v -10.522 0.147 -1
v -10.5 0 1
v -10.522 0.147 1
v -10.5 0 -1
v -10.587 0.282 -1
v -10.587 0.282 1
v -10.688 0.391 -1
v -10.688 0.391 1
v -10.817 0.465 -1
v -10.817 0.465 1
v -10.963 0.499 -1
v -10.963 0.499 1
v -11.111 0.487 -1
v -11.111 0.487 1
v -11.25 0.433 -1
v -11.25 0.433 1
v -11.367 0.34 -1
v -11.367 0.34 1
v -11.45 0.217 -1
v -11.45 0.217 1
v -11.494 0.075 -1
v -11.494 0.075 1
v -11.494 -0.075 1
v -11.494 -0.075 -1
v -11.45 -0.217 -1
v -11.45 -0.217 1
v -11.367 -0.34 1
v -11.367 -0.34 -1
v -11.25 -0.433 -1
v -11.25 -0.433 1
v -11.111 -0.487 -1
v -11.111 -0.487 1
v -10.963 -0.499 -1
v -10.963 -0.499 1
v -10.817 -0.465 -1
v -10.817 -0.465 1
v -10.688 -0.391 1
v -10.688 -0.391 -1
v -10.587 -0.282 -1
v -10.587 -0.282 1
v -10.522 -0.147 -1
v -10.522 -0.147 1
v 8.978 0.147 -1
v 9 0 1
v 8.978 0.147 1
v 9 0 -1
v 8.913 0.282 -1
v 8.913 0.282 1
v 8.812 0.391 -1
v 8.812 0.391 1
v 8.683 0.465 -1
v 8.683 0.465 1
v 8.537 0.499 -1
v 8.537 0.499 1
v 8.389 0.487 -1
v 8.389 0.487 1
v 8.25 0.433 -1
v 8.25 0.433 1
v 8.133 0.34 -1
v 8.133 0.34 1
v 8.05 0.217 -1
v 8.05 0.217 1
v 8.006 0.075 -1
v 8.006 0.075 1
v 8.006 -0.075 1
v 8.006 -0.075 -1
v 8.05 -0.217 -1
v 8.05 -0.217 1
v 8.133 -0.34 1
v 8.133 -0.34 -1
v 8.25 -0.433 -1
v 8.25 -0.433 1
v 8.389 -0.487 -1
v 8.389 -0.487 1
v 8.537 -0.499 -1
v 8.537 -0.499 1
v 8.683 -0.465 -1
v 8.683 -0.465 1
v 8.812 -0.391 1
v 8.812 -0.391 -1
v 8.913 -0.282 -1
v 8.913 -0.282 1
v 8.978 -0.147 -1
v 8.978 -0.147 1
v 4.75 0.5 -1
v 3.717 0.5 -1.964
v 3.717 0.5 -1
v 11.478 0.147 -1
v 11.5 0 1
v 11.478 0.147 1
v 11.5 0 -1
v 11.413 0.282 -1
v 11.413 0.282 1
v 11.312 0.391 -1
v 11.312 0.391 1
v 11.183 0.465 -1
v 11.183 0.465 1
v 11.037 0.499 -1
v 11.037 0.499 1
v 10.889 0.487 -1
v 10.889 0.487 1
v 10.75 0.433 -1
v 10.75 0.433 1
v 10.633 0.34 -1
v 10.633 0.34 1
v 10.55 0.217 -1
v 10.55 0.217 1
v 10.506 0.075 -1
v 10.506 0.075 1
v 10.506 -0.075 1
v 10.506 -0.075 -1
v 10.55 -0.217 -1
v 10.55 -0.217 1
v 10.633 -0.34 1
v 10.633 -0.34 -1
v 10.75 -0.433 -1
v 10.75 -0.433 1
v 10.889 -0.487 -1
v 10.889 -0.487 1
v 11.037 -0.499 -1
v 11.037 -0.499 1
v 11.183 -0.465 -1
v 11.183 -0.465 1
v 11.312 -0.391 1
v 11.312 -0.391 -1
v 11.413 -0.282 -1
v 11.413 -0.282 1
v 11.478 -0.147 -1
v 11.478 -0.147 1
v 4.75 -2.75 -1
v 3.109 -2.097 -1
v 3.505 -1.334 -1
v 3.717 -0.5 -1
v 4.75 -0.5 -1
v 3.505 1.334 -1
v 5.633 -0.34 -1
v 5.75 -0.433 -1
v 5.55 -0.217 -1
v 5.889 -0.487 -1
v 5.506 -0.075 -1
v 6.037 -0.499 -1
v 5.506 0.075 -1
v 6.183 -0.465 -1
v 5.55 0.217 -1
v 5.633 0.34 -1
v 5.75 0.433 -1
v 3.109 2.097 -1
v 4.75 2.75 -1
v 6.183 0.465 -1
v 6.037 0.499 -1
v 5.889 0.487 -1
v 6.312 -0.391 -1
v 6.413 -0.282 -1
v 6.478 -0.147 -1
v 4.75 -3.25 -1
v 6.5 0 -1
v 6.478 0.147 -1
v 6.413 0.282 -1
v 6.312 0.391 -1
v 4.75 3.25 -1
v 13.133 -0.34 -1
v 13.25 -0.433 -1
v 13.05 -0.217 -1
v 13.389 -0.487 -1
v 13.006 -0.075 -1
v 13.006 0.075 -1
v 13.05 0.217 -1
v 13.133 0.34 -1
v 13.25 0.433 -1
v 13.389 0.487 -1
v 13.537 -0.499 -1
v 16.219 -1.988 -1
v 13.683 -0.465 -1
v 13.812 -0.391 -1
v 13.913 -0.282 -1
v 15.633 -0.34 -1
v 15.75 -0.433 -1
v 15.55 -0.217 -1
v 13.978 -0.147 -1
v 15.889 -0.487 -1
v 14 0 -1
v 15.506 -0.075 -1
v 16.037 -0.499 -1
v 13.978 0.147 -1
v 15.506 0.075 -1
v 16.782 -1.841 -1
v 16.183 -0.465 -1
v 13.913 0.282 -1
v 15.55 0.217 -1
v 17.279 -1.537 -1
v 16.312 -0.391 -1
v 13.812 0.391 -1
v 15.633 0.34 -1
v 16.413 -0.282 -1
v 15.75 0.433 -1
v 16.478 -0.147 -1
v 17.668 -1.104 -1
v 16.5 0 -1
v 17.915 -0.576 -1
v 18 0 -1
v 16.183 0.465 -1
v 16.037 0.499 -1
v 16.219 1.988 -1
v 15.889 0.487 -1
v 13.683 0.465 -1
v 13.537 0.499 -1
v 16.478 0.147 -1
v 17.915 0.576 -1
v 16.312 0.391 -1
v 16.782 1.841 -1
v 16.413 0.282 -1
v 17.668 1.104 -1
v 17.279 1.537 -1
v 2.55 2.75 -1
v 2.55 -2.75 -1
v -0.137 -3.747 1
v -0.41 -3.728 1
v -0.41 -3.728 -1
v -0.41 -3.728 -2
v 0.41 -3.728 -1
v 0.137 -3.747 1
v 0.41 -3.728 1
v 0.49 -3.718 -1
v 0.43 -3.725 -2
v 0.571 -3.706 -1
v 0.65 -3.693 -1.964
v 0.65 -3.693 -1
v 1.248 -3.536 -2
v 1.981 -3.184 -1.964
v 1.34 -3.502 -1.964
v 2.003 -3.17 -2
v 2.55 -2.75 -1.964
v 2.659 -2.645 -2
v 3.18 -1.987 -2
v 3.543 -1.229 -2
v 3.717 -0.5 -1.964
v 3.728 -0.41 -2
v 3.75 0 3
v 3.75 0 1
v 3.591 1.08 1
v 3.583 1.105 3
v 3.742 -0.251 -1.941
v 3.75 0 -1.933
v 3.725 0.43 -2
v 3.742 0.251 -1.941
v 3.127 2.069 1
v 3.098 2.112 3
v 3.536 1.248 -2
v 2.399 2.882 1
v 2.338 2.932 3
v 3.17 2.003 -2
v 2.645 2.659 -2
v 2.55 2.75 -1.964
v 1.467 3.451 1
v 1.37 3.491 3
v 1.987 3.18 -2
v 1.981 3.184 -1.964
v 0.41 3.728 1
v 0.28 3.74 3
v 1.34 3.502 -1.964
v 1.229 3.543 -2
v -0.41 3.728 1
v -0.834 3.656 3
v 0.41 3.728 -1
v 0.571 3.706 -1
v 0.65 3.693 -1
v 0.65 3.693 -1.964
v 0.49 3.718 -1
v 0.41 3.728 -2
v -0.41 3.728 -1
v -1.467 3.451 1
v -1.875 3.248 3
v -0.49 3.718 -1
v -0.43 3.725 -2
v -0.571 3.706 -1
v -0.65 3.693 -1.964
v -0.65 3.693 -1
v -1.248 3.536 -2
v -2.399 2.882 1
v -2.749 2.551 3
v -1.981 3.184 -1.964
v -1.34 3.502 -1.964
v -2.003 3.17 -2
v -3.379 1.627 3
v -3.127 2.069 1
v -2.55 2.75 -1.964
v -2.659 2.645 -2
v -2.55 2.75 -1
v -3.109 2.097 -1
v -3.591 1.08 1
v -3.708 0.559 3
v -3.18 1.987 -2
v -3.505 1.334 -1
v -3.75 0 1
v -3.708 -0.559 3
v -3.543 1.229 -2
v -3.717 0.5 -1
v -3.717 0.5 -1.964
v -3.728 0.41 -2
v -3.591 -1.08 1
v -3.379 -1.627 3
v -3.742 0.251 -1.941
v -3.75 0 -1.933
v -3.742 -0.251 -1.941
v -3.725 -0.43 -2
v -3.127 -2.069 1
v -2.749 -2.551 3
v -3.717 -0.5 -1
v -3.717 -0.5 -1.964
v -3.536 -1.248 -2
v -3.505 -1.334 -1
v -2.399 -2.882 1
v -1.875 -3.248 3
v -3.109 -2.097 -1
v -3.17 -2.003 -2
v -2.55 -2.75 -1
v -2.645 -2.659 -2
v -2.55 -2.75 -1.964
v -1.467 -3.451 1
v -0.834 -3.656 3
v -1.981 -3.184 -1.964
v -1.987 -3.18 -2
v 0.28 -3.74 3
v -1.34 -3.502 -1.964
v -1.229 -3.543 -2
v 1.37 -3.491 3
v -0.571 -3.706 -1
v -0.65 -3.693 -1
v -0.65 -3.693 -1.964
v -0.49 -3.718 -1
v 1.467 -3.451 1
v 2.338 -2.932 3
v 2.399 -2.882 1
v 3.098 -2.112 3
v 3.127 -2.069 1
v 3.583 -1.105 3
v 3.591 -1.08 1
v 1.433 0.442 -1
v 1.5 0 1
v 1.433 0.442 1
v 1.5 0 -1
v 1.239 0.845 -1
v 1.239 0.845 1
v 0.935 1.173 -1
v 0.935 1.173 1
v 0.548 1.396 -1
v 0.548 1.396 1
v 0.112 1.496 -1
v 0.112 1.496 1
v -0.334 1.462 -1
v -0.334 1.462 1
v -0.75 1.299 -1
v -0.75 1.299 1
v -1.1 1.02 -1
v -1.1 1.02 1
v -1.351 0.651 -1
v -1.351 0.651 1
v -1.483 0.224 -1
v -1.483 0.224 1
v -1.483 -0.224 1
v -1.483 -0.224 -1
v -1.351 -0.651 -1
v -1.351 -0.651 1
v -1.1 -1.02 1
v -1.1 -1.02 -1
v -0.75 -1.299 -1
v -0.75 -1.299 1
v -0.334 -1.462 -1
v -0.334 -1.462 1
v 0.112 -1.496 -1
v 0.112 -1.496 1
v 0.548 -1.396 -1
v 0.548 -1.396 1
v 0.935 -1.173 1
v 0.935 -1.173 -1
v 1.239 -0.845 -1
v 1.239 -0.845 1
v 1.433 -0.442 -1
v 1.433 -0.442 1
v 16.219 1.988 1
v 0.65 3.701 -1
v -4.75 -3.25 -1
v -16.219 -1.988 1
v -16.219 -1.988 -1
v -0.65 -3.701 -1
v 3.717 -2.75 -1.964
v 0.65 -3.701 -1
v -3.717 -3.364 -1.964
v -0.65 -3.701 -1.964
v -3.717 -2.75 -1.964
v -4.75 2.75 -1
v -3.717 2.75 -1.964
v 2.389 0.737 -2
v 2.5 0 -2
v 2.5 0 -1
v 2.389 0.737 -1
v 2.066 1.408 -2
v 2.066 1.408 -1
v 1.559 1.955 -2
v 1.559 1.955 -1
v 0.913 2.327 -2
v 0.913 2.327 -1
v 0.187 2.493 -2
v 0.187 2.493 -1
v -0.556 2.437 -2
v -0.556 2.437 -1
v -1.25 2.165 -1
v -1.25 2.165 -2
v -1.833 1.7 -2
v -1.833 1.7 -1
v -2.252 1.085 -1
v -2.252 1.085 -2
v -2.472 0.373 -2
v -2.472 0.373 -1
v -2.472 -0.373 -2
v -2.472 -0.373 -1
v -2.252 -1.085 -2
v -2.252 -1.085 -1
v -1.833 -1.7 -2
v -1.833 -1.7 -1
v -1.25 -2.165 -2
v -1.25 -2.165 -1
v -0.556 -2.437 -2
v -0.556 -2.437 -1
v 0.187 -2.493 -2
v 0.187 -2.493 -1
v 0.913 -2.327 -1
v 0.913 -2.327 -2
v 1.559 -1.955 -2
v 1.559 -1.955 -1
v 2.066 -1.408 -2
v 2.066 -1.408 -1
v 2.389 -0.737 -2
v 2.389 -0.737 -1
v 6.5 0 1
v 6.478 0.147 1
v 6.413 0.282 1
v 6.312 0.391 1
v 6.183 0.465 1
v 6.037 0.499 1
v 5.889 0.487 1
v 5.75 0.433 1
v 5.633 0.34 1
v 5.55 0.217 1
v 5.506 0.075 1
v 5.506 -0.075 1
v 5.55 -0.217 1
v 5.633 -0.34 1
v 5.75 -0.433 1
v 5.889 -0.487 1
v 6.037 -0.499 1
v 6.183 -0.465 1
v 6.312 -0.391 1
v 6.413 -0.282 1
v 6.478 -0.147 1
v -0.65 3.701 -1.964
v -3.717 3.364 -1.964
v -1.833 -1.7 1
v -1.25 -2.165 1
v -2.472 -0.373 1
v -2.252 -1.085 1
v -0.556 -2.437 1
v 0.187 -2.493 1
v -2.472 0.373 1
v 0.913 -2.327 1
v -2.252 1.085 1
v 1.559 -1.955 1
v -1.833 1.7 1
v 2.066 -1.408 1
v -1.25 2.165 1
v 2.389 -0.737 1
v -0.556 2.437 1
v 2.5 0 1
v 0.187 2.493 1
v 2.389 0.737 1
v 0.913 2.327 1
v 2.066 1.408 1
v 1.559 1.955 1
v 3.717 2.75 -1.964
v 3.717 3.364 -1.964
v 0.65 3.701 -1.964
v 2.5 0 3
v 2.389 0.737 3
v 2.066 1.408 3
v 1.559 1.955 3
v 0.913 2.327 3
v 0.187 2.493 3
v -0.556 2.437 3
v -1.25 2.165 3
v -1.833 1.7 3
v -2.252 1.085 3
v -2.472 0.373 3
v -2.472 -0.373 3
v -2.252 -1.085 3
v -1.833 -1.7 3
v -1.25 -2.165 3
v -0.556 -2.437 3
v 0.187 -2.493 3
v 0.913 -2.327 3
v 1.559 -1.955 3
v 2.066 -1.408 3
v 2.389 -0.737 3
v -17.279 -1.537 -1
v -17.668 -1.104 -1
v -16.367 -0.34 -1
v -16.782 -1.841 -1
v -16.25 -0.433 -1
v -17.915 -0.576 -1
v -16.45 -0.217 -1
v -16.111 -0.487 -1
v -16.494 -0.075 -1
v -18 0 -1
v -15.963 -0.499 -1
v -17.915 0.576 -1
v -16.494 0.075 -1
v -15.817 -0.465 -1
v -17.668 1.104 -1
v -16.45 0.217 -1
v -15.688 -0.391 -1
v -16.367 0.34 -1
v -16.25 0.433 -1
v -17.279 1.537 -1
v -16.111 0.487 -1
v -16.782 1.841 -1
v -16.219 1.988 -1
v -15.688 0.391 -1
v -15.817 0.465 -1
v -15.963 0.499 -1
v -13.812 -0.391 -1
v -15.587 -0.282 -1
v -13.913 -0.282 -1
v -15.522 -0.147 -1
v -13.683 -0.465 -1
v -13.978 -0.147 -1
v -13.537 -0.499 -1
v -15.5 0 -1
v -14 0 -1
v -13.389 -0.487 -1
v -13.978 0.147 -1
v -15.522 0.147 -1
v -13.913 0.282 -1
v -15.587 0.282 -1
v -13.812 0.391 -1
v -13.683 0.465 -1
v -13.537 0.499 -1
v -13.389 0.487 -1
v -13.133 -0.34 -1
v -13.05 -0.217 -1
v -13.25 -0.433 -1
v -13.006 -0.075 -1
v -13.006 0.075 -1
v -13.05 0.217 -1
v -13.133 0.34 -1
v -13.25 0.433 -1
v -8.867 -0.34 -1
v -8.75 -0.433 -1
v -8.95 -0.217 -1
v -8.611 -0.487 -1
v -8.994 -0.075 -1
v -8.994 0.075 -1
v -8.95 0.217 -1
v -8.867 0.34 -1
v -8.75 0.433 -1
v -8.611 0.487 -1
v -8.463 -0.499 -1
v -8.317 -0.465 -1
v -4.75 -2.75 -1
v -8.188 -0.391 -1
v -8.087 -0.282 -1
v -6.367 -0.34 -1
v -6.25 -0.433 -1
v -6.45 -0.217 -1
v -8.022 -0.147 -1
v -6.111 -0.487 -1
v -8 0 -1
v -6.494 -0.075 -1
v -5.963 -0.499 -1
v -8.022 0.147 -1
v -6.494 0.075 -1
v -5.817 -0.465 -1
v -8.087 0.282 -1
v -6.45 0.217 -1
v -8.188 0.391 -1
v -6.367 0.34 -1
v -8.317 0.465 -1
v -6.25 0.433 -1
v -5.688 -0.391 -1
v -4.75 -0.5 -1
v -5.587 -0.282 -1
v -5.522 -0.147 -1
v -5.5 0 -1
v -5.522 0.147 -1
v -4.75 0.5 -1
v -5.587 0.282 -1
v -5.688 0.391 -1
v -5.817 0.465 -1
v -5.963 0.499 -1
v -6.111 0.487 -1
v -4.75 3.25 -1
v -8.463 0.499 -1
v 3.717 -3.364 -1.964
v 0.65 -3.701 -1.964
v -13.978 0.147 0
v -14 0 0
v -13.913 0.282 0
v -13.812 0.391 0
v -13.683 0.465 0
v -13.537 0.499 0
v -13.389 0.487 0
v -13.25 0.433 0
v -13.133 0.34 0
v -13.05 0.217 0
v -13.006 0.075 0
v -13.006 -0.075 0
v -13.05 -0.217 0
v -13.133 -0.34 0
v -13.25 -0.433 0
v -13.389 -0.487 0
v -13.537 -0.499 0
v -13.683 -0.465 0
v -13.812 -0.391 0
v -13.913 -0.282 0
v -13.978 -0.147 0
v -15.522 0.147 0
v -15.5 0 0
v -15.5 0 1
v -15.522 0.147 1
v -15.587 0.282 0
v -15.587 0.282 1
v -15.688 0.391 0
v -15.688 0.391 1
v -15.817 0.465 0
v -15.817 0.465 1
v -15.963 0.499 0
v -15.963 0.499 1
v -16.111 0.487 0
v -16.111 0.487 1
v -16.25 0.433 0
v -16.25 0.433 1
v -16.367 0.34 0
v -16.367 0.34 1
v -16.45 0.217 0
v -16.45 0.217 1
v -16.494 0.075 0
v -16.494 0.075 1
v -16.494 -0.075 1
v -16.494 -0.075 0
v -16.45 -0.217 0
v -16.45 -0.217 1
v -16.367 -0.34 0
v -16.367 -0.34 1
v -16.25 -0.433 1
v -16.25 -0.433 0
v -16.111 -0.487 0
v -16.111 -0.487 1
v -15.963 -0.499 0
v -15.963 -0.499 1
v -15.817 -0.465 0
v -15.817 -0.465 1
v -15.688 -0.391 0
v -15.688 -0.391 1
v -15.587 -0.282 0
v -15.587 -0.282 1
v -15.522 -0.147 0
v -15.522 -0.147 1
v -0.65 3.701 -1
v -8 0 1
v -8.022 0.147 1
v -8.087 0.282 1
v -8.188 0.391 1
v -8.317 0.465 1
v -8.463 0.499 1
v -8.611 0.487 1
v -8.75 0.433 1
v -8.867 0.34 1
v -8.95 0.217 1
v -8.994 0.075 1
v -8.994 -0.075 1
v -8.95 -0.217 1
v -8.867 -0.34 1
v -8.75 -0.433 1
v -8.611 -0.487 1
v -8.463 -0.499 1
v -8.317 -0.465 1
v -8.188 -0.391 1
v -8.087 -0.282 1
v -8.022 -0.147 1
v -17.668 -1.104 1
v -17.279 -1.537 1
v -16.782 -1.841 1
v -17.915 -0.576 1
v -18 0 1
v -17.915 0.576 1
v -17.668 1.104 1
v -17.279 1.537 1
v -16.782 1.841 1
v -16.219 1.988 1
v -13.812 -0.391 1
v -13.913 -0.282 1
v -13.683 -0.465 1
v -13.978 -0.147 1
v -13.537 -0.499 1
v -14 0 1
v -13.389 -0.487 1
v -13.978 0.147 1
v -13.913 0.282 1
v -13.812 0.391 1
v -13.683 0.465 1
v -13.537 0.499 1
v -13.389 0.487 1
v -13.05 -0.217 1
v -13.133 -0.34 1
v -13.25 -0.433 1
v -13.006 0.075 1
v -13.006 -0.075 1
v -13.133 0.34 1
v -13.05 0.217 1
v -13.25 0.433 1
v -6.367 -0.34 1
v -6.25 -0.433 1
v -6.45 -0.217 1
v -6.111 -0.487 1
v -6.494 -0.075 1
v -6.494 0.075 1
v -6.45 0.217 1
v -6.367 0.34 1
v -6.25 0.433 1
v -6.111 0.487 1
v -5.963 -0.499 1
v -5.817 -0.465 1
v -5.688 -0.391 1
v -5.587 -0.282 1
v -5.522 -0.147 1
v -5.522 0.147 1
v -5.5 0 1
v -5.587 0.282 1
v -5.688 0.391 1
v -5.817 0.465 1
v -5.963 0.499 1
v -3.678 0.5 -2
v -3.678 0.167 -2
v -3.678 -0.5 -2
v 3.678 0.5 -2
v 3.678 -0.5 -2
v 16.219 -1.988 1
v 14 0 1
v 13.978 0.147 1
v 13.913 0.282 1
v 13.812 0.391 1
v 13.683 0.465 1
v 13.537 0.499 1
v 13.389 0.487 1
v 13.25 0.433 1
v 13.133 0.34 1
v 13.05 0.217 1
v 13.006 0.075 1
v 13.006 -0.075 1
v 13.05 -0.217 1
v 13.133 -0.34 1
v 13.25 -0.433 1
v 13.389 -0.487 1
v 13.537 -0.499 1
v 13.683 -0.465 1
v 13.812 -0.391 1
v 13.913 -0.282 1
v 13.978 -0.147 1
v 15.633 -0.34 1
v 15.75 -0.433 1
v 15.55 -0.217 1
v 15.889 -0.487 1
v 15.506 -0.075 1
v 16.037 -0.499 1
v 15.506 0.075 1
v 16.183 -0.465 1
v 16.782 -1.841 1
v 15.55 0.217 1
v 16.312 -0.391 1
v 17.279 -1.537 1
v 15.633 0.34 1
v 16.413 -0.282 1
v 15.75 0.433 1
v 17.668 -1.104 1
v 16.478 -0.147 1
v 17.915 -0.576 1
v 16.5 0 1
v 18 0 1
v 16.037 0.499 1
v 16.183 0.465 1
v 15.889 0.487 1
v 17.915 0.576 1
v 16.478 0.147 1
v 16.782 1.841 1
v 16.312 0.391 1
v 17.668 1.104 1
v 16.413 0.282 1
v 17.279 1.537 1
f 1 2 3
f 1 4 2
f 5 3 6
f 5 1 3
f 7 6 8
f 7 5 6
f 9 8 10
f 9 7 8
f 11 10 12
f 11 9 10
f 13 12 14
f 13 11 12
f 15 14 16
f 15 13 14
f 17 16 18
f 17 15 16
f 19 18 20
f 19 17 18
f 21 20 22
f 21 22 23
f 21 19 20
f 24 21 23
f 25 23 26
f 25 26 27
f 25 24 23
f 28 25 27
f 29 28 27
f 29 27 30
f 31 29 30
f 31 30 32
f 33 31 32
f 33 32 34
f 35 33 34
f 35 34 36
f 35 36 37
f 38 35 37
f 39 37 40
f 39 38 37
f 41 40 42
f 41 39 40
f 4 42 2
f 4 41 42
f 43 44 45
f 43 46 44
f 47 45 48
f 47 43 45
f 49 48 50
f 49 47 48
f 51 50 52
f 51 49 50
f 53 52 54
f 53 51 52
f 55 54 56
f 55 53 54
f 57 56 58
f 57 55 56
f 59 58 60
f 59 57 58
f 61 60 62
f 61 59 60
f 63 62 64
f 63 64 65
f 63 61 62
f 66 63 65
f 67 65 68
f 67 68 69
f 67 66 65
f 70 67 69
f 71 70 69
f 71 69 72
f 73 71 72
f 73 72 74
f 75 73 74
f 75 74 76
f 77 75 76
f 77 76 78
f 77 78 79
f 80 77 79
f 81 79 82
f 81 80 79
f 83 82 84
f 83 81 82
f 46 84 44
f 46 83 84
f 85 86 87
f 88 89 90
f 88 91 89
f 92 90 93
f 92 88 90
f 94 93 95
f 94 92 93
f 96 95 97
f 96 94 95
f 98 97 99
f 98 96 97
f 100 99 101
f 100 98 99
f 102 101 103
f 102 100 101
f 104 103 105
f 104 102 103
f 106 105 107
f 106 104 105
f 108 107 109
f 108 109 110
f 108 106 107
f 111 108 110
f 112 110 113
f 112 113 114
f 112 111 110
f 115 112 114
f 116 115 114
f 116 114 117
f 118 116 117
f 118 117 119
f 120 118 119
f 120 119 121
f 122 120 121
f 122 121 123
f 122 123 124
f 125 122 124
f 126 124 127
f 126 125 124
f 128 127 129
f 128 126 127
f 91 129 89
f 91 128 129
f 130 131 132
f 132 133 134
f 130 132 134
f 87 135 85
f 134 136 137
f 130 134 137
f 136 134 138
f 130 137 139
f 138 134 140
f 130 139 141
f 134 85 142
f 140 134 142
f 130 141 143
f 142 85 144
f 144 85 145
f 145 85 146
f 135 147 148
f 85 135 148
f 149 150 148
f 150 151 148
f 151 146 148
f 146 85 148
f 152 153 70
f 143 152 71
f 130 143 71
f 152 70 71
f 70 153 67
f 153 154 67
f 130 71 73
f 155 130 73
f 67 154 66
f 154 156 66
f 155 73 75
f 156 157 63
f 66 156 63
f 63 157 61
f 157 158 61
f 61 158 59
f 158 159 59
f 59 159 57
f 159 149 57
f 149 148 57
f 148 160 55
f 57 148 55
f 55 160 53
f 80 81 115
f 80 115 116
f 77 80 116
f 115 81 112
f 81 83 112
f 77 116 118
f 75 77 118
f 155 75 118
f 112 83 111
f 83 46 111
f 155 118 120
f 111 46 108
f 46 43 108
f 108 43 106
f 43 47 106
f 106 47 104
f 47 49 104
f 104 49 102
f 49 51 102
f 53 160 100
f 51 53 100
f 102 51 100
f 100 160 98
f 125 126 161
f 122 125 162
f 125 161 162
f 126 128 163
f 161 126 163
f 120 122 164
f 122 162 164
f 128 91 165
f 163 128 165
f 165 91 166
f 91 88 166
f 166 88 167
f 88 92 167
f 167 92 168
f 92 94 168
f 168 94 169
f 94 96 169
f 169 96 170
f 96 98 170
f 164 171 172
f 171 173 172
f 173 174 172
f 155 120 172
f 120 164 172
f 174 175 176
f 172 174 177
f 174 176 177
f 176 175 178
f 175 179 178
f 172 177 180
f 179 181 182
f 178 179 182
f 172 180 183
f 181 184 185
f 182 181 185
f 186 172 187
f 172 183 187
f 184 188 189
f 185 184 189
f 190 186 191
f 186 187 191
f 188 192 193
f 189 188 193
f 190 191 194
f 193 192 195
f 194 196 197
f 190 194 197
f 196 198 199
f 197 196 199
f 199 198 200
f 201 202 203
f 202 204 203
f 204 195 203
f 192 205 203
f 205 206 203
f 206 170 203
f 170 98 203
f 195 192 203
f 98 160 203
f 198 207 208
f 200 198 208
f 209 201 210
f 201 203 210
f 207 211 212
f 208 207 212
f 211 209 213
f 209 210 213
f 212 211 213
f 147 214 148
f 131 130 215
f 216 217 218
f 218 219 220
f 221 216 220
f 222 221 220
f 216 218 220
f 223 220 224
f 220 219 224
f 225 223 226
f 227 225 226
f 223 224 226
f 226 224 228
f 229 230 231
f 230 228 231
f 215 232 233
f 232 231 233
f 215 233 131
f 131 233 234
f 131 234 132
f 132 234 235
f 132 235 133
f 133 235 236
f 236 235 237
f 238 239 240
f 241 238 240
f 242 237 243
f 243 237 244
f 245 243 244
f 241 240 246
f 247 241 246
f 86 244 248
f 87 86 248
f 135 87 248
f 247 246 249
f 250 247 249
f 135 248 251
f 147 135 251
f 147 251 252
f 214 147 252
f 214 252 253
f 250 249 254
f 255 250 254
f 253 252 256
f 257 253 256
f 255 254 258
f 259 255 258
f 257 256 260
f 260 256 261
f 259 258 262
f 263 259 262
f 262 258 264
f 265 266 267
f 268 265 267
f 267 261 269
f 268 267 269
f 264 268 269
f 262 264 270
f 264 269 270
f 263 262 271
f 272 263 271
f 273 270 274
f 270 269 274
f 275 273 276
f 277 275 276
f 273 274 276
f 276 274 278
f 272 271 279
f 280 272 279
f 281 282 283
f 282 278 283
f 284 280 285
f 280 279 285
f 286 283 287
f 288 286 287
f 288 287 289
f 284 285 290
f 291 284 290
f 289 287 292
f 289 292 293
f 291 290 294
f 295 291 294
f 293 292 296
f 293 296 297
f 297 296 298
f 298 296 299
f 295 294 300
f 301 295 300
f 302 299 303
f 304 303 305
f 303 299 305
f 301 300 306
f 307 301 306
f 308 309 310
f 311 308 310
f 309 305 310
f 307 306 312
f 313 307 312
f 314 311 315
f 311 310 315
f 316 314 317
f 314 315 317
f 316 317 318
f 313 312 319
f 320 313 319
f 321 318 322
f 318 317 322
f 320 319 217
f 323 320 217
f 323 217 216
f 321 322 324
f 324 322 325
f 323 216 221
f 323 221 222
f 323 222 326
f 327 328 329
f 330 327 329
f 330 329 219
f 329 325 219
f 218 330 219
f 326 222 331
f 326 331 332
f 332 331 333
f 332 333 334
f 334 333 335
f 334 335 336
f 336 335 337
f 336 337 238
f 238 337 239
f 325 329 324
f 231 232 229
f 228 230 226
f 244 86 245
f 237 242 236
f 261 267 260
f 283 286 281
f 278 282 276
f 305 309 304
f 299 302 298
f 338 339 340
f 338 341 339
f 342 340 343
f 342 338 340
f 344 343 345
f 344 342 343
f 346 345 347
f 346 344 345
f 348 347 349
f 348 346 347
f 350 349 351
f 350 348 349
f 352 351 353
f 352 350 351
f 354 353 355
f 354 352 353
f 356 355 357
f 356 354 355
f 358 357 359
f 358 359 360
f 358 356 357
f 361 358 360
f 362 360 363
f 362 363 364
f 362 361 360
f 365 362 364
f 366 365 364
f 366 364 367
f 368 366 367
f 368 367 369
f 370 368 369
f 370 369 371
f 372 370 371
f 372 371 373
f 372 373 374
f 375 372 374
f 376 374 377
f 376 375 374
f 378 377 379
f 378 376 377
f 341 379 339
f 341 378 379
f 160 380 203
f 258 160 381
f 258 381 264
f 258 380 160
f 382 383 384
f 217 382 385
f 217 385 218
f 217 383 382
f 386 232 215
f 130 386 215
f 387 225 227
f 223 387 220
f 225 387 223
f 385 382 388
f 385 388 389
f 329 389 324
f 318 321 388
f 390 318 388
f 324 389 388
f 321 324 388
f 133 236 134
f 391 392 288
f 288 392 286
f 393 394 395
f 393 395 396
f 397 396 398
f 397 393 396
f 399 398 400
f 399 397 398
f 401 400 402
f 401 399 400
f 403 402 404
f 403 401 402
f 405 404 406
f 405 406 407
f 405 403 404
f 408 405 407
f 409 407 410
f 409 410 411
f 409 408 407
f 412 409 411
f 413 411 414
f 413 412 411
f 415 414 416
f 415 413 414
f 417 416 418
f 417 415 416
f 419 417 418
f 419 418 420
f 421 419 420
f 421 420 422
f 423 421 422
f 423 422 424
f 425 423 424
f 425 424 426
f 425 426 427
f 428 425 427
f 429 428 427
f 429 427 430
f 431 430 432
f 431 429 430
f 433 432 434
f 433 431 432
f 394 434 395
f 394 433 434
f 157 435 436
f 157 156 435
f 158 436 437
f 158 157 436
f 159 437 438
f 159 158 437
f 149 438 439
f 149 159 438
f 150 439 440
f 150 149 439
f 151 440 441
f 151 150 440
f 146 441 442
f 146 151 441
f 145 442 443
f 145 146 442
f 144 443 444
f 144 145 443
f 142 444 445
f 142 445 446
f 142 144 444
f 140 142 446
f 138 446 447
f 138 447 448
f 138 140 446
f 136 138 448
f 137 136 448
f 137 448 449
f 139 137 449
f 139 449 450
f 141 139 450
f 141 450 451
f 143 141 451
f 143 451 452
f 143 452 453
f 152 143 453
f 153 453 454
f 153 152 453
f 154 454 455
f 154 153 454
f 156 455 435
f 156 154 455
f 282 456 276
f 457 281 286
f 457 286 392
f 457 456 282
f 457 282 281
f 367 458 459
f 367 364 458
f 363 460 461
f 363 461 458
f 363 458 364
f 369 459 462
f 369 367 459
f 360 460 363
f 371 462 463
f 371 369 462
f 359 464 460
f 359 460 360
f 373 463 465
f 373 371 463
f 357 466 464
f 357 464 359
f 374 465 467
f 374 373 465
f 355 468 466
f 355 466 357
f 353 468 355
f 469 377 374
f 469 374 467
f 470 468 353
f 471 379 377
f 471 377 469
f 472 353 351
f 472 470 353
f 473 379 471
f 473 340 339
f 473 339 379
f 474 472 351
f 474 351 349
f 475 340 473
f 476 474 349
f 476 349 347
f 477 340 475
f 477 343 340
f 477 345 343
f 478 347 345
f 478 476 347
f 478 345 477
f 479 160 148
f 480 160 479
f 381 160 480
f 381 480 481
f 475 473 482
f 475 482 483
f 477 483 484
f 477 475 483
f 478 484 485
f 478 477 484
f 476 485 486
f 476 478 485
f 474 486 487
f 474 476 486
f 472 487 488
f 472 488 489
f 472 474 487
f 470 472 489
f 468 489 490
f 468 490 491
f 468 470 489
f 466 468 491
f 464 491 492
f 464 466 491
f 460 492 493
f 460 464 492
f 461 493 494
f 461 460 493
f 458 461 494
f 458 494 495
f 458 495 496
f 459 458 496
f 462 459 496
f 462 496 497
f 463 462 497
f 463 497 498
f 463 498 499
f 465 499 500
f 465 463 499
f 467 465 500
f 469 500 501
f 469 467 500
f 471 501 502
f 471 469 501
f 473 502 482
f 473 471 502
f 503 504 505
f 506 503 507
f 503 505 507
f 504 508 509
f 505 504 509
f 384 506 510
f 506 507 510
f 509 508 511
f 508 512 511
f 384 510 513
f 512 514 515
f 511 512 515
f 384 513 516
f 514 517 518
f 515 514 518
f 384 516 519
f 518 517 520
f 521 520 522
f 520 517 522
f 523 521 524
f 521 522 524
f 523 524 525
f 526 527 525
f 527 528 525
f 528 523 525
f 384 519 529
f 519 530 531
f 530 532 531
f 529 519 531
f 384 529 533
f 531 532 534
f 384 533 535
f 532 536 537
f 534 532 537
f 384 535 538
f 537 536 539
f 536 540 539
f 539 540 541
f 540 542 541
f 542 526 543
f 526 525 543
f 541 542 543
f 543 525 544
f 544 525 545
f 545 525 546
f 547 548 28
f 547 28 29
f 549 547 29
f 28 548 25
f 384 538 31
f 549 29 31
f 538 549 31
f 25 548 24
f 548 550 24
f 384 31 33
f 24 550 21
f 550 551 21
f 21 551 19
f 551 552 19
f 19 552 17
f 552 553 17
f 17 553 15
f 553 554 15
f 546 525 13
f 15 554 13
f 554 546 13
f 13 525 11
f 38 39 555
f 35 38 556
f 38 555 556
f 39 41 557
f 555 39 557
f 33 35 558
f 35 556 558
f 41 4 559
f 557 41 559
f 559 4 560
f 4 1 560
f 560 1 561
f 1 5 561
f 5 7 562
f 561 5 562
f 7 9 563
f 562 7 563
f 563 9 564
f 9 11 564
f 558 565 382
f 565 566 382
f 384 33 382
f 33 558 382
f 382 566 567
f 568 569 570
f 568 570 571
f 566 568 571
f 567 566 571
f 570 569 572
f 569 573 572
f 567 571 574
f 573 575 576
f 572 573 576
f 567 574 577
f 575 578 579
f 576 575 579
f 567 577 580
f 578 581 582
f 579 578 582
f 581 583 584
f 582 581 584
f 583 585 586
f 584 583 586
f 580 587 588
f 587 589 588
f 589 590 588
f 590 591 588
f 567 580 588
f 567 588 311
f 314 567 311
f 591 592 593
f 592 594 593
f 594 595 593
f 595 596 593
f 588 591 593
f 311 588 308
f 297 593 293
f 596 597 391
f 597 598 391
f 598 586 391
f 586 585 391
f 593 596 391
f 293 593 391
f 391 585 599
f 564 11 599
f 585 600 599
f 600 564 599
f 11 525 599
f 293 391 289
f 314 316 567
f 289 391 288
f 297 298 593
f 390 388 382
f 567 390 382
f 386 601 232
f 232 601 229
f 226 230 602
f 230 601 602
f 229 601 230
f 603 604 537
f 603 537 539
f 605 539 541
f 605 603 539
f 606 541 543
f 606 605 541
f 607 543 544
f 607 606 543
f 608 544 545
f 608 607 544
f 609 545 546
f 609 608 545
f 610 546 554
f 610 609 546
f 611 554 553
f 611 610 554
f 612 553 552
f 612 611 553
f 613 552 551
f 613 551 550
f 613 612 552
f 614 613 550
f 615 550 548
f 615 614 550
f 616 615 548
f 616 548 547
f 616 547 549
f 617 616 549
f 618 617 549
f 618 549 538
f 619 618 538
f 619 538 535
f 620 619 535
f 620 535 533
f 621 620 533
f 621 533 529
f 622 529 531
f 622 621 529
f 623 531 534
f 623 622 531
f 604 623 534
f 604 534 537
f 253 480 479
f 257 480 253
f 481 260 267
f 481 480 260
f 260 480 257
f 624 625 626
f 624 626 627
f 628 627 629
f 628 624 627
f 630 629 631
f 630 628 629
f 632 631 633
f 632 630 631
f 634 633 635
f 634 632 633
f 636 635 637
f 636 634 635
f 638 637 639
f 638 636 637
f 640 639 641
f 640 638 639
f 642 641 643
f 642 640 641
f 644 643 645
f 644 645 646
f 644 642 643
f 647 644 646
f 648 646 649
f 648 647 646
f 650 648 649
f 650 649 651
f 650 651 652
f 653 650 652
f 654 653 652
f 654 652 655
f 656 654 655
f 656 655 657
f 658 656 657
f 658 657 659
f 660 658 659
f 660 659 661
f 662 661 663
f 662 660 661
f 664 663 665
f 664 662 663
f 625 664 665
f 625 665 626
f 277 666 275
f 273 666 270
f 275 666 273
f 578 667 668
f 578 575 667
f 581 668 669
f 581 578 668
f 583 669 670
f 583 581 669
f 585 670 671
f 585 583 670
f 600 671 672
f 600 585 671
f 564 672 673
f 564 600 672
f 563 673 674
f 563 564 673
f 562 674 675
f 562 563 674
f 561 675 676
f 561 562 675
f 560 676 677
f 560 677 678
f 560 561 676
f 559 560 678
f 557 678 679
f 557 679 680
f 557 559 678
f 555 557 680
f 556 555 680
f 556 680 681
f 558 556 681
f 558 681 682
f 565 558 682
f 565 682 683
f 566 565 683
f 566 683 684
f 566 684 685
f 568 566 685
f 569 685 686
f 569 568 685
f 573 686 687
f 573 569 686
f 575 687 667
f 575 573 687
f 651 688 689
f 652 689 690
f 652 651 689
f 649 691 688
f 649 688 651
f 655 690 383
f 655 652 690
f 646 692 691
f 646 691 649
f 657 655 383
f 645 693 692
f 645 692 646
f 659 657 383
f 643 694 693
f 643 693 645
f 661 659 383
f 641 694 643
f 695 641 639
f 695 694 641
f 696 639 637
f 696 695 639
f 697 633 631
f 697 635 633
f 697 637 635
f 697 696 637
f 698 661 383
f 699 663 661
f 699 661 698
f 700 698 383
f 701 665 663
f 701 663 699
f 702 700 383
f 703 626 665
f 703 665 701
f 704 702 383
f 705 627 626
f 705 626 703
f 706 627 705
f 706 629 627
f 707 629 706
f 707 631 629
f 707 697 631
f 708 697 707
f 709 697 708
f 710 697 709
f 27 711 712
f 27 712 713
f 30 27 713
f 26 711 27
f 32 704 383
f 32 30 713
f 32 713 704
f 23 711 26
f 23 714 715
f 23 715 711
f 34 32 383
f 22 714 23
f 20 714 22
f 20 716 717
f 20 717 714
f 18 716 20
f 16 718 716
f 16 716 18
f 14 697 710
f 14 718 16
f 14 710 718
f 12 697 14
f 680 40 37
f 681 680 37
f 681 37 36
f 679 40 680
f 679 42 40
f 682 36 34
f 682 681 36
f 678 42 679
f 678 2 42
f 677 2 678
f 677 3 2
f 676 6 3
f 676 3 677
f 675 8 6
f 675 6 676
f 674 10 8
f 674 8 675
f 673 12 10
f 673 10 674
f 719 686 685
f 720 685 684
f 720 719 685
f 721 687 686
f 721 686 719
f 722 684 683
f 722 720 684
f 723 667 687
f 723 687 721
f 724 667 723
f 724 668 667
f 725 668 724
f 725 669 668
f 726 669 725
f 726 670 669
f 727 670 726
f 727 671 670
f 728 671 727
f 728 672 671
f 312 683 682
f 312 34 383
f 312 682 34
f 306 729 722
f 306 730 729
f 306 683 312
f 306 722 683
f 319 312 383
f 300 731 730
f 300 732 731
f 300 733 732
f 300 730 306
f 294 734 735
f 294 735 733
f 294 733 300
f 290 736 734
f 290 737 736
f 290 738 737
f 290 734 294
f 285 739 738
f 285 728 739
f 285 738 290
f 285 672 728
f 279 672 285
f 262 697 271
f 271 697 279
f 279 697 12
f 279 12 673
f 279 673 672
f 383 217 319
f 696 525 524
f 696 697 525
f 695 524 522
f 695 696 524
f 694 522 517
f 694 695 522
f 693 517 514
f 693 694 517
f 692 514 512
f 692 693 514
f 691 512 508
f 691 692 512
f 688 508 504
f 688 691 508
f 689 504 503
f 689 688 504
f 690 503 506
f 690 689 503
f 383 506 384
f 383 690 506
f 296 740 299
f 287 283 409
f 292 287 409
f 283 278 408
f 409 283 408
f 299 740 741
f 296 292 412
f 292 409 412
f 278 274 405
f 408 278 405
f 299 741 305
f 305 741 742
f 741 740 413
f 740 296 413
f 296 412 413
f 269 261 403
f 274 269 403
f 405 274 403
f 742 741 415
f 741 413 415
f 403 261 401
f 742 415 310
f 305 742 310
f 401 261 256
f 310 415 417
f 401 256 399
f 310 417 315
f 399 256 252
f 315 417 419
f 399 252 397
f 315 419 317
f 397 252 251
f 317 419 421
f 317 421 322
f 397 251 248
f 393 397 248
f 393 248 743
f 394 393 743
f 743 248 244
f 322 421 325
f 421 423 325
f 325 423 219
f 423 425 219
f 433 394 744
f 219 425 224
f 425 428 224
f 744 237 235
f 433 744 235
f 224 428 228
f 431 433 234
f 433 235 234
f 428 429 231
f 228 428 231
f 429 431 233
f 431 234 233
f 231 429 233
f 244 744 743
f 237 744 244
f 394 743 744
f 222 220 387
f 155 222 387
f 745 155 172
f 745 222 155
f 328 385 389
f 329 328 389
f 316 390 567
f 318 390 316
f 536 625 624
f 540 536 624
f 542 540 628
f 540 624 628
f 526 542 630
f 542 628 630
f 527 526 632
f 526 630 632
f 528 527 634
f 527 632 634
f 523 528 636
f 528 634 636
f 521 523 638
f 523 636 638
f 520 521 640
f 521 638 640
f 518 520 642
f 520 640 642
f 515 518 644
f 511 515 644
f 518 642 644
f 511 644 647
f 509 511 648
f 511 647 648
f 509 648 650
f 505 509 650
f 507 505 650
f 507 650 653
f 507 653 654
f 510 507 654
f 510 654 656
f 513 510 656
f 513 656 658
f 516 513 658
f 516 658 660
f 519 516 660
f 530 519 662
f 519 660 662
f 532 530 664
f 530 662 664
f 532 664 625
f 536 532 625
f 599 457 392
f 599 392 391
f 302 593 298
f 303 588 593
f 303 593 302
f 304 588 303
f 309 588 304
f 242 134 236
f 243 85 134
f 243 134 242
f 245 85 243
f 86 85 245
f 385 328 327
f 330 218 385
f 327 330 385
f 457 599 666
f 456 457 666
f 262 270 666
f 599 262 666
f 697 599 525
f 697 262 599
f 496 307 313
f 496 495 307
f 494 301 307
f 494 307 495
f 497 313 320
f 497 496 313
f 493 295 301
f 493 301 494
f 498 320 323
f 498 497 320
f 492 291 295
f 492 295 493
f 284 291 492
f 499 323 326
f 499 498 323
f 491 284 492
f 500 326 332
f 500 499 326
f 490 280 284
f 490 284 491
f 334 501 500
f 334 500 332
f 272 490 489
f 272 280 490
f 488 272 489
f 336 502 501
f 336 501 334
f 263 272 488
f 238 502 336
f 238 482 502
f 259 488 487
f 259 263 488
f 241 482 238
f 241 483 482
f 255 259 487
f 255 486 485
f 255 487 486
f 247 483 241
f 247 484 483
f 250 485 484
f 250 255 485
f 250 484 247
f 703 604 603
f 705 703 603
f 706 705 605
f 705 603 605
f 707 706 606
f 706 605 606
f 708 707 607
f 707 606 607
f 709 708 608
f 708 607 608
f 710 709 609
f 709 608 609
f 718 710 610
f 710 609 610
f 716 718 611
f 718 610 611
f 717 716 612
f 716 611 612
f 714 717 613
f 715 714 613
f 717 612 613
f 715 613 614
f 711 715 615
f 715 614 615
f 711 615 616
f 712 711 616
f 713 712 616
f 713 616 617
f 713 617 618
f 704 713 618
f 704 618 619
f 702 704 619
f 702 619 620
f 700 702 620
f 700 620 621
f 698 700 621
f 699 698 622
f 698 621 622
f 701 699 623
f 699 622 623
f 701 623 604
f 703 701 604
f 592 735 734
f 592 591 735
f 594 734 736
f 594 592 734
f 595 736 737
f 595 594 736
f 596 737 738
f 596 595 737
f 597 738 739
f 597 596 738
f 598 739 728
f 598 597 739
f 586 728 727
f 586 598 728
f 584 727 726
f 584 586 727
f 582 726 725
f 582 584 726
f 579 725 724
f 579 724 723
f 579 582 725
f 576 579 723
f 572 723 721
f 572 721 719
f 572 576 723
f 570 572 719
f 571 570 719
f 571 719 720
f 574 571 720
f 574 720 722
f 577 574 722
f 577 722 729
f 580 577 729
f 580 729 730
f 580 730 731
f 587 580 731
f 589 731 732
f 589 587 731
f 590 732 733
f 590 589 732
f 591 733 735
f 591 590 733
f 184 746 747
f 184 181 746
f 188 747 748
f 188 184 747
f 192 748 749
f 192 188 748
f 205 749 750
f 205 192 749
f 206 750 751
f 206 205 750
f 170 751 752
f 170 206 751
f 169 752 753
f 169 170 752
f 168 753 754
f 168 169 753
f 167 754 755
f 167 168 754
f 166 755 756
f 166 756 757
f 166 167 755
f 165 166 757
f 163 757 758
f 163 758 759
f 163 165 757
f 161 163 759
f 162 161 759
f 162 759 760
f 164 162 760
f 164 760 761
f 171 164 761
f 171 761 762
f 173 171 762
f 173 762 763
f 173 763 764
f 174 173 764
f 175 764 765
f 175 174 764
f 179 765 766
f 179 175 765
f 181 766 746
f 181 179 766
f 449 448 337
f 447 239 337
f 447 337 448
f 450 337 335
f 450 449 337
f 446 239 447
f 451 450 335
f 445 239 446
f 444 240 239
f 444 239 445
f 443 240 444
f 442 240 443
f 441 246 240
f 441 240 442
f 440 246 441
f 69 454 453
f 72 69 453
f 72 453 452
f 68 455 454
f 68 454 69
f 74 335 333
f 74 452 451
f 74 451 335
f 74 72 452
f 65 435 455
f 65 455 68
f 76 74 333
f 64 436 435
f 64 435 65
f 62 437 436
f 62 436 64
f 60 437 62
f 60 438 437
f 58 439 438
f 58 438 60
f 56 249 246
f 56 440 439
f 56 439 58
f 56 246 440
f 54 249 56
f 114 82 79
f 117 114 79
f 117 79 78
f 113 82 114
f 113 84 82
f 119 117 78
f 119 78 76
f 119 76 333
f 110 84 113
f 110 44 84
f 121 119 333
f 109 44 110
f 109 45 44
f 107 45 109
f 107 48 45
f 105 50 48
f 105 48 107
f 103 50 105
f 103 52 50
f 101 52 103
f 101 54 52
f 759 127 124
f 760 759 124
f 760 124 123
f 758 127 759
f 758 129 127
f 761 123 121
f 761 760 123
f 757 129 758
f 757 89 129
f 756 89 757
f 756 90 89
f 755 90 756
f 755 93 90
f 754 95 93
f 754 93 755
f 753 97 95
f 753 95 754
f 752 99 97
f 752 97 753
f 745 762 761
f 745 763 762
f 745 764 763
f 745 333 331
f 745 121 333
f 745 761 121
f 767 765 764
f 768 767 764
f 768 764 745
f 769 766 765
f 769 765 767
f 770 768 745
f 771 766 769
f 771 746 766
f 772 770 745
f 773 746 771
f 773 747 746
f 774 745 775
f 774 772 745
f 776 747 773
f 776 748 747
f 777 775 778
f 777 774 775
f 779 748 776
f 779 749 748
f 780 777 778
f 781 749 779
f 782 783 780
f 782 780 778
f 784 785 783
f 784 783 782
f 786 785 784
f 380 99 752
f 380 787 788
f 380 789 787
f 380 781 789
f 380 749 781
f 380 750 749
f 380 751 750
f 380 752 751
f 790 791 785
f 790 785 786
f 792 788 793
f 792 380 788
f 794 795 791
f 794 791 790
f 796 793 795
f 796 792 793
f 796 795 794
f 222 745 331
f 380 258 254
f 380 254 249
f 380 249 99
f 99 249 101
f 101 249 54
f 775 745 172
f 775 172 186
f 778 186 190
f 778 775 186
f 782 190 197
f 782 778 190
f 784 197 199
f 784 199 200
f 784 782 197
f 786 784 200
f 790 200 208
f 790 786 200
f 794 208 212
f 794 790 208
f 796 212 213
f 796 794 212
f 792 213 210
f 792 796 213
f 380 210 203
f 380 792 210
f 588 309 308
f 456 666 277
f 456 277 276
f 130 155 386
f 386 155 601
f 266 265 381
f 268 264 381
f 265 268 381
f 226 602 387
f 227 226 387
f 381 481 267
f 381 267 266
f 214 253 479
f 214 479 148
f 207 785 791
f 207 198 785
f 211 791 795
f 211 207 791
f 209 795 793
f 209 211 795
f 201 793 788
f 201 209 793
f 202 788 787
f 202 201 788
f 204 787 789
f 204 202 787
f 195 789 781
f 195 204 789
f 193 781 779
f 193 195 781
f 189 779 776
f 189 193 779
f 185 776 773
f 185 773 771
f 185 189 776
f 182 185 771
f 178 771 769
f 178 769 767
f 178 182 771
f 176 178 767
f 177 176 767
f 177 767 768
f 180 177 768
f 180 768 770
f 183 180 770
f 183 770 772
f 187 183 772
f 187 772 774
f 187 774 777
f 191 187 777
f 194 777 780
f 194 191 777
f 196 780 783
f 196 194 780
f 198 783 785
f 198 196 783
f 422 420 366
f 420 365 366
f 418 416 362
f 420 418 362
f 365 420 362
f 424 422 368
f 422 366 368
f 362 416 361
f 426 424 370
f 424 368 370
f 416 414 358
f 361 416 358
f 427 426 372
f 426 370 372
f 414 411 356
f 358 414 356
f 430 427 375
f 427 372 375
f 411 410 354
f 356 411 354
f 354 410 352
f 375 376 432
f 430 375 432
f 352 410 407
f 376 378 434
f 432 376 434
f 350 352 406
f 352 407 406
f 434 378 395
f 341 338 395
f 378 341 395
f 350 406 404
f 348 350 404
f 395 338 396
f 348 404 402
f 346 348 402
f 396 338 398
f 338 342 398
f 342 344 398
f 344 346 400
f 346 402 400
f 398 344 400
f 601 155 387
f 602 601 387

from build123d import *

# Parameters (mm, degrees)
CROQUIS1_R              = 0.5
CROQUIS1_R_2            = 2
CROQUIS1_R_3            = 3.75
CROQUIS1_R_4            = 2.5
CROQUIS1_R_5            = 1.5
SALIENTE_EXTRUIR1_DEPTH = 1
SALIENTE_EXTRUIR2_START = -2
CROQUIS1_3_R            = 3.75
CROQUIS1_3_R_2          = 2.5
SALIENTE_EXTRUIR2_DEPTH = 1
SALIENTE_EXTRUIR3_START = 1
CROQUIS1_4_R            = 3.75
CROQUIS1_4_R_2          = 2.5
SALIENTE_EXTRUIR3_DEPTH = 2
SALIENTE_EXTRUIR5_DEPTH = 0.5
SALIENTE_EXTRUIR6_START = 3.75
SALIENTE_EXTRUIR6_DEPTH = 1
SALIENTE_EXTRUIR7_START = -3.75
SALIENTE_EXTRUIR7_DEPTH = 1
CORTAR_EXTRUIR1_DEPTH   = 3


with BuildPart() as part:
    # Croquis1 → Saliente-Extruir1 (new, symmetric)
    with BuildSketch(Plane.XY):
        with BuildLine():
            ThreePointArc((-0.410156, -3.727502), (-3.75, 0), (-0.410156, 3.727502))
            Line((-0.410156, 3.727502), (-16.21875, 1.988001))
            ThreePointArc((-16.21875, 1.988001), (-14.665365, 1.489547), (-14, 0))
            ThreePointArc((-14, 0), (-14.665365, -1.489547), (-16.21875, -1.988001))
            Line((-16.21875, -1.988001), (-0.410156, -3.727502))
        make_face()
        with BuildLine():
            ThreePointArc((-13, 0), (-13.5, -0.5), (-14, 0))
            ThreePointArc((-14, 0), (-13.5, 0.5), (-13, 0))
        make_face(mode=Mode.SUBTRACT)
        with Locations((-11, 0)):
            Circle(CROQUIS1_R, mode=Mode.SUBTRACT)
        with Locations((-8.5, 0)):
            Circle(CROQUIS1_R, mode=Mode.SUBTRACT)
        with Locations((-6, 0)):
            Circle(CROQUIS1_R, mode=Mode.SUBTRACT)
        with Locations((-16, 0)):
            Circle(CROQUIS1_R_2)
        with Locations((-16, 0)):
            Circle(CROQUIS1_R, mode=Mode.SUBTRACT)
        Circle(CROQUIS1_R_3)
        Circle(CROQUIS1_R_4, mode=Mode.SUBTRACT)
        Circle(CROQUIS1_R_4)
        Circle(CROQUIS1_R_5, mode=Mode.SUBTRACT)
        with BuildLine():
            Line((16.21875, 1.988001), (0.410156, 3.727502))
            ThreePointArc((0.410156, 3.727502), (2.7929, 2.50244), (3.75, 0))
            ThreePointArc((3.75, 0), (2.7929, -2.50244), (0.410156, -3.727502))
            Line((0.410156, -3.727502), (16.21875, -1.988001))
            ThreePointArc((16.21875, -1.988001), (14.665365, -1.489547), (14, 0))
            ThreePointArc((14, 0), (14.665365, 1.489547), (16.21875, 1.988001))
        make_face()
        with Locations((6, 0)):
            Circle(CROQUIS1_R, mode=Mode.SUBTRACT)
        with Locations((8.5, 0)):
            Circle(CROQUIS1_R, mode=Mode.SUBTRACT)
        with Locations((11, 0)):
            Circle(CROQUIS1_R, mode=Mode.SUBTRACT)
        with Locations((13.5, 0)):
            Circle(CROQUIS1_R, mode=Mode.SUBTRACT)
        with Locations((16, 0)):
            Circle(CROQUIS1_R_2)
        with Locations((16, 0)):
            Circle(CROQUIS1_R, mode=Mode.SUBTRACT)
    extrude(amount=SALIENTE_EXTRUIR1_DEPTH, both=True)

    # Croquis1<3> → Saliente-Extruir2 (add)
    with BuildSketch(Plane.XY.offset(SALIENTE_EXTRUIR2_START)):
        with Locations(Location((0, 0, 0), (0, 0, 263.720712))):
            Circle(CROQUIS1_3_R)
        Circle(CROQUIS1_3_R_2, mode=Mode.SUBTRACT)
    extrude(amount=SALIENTE_EXTRUIR2_DEPTH)

    # Croquis1<4> → Saliente-Extruir3 (add)
    with BuildSketch(Plane.XY.offset(SALIENTE_EXTRUIR3_START)):
        Circle(CROQUIS1_4_R)
        Circle(CROQUIS1_4_R_2, mode=Mode.SUBTRACT)
    extrude(amount=SALIENTE_EXTRUIR3_DEPTH)

    # Croquis3 → Saliente-Extruir5 (add, symmetric)
    with BuildSketch(Plane(origin=(0, 0, 0), x_dir=(1, 0, 0), z_dir=(0, 1, 0))):
        Polygon((-4.75, 1), (-3.678391, 2), (-3.678391, 1), align=None)
        Polygon((3.678391, 1), (4.75, 1), (3.678391, 2), align=None)
    extrude(amount=SALIENTE_EXTRUIR5_DEPTH, both=True)

    # Croquis4 → Saliente-Extruir6 (add)
    with BuildSketch(Plane(origin=(0, 0, 0), x_dir=(1, 0, 0), z_dir=(0, 1, 0)).offset(SALIENTE_EXTRUIR6_START)):
        Polygon((-4.75, 1), (-0.650356, 1), (-0.650356, 1.964422), (-3.716517, 1.964422), align=None)
        Polygon((0.650356, 1.964422), (0.650356, 1), (4.75, 1), (3.716517, 1.964422), align=None)
    extrude(amount=-SALIENTE_EXTRUIR6_DEPTH)

    # Croquis4<2> → Saliente-Extruir7 (add)
    with BuildSketch(Plane(origin=(0, 0, 0), x_dir=(1, 0, 0), z_dir=(0, 1, 0)).offset(SALIENTE_EXTRUIR7_START)):
        Polygon((-4.75, 1), (-0.650356, 1), (-0.650356, 1.964422), (-3.716517, 1.964422), align=None)
        Polygon((0.650356, 1.964422), (0.650356, 1), (4.75, 1), (3.716517, 1.964422), align=None)
    extrude(amount=SALIENTE_EXTRUIR7_DEPTH)

    # Croquis5 → Cortar-Extruir1 (cut)
    with BuildSketch(Plane.XY.offset(-1)):
        Polygon((0.650356, -3.75), (4.75, -3.75), (4.75, -3.249967), (0.650356, -3.701072), align=None)
        Polygon((-0.650356, -3.701072), (-0.650356, -3.75), (-4.75, -3.75), (-4.75, -3.249967), align=None)
        Polygon((-4.75, 3.75), (-4.75, 3.249967), (-0.650356, 3.701072), (-0.650356, 3.75), align=None)
        Polygon((0.650356, 3.701072), (0.650356, 3.75), (4.75, 3.75), (4.75, 3.249967), align=None)
    extrude(amount=-CORTAR_EXTRUIR1_DEPTH, mode=Mode.SUBTRACT)


solid = part.part
